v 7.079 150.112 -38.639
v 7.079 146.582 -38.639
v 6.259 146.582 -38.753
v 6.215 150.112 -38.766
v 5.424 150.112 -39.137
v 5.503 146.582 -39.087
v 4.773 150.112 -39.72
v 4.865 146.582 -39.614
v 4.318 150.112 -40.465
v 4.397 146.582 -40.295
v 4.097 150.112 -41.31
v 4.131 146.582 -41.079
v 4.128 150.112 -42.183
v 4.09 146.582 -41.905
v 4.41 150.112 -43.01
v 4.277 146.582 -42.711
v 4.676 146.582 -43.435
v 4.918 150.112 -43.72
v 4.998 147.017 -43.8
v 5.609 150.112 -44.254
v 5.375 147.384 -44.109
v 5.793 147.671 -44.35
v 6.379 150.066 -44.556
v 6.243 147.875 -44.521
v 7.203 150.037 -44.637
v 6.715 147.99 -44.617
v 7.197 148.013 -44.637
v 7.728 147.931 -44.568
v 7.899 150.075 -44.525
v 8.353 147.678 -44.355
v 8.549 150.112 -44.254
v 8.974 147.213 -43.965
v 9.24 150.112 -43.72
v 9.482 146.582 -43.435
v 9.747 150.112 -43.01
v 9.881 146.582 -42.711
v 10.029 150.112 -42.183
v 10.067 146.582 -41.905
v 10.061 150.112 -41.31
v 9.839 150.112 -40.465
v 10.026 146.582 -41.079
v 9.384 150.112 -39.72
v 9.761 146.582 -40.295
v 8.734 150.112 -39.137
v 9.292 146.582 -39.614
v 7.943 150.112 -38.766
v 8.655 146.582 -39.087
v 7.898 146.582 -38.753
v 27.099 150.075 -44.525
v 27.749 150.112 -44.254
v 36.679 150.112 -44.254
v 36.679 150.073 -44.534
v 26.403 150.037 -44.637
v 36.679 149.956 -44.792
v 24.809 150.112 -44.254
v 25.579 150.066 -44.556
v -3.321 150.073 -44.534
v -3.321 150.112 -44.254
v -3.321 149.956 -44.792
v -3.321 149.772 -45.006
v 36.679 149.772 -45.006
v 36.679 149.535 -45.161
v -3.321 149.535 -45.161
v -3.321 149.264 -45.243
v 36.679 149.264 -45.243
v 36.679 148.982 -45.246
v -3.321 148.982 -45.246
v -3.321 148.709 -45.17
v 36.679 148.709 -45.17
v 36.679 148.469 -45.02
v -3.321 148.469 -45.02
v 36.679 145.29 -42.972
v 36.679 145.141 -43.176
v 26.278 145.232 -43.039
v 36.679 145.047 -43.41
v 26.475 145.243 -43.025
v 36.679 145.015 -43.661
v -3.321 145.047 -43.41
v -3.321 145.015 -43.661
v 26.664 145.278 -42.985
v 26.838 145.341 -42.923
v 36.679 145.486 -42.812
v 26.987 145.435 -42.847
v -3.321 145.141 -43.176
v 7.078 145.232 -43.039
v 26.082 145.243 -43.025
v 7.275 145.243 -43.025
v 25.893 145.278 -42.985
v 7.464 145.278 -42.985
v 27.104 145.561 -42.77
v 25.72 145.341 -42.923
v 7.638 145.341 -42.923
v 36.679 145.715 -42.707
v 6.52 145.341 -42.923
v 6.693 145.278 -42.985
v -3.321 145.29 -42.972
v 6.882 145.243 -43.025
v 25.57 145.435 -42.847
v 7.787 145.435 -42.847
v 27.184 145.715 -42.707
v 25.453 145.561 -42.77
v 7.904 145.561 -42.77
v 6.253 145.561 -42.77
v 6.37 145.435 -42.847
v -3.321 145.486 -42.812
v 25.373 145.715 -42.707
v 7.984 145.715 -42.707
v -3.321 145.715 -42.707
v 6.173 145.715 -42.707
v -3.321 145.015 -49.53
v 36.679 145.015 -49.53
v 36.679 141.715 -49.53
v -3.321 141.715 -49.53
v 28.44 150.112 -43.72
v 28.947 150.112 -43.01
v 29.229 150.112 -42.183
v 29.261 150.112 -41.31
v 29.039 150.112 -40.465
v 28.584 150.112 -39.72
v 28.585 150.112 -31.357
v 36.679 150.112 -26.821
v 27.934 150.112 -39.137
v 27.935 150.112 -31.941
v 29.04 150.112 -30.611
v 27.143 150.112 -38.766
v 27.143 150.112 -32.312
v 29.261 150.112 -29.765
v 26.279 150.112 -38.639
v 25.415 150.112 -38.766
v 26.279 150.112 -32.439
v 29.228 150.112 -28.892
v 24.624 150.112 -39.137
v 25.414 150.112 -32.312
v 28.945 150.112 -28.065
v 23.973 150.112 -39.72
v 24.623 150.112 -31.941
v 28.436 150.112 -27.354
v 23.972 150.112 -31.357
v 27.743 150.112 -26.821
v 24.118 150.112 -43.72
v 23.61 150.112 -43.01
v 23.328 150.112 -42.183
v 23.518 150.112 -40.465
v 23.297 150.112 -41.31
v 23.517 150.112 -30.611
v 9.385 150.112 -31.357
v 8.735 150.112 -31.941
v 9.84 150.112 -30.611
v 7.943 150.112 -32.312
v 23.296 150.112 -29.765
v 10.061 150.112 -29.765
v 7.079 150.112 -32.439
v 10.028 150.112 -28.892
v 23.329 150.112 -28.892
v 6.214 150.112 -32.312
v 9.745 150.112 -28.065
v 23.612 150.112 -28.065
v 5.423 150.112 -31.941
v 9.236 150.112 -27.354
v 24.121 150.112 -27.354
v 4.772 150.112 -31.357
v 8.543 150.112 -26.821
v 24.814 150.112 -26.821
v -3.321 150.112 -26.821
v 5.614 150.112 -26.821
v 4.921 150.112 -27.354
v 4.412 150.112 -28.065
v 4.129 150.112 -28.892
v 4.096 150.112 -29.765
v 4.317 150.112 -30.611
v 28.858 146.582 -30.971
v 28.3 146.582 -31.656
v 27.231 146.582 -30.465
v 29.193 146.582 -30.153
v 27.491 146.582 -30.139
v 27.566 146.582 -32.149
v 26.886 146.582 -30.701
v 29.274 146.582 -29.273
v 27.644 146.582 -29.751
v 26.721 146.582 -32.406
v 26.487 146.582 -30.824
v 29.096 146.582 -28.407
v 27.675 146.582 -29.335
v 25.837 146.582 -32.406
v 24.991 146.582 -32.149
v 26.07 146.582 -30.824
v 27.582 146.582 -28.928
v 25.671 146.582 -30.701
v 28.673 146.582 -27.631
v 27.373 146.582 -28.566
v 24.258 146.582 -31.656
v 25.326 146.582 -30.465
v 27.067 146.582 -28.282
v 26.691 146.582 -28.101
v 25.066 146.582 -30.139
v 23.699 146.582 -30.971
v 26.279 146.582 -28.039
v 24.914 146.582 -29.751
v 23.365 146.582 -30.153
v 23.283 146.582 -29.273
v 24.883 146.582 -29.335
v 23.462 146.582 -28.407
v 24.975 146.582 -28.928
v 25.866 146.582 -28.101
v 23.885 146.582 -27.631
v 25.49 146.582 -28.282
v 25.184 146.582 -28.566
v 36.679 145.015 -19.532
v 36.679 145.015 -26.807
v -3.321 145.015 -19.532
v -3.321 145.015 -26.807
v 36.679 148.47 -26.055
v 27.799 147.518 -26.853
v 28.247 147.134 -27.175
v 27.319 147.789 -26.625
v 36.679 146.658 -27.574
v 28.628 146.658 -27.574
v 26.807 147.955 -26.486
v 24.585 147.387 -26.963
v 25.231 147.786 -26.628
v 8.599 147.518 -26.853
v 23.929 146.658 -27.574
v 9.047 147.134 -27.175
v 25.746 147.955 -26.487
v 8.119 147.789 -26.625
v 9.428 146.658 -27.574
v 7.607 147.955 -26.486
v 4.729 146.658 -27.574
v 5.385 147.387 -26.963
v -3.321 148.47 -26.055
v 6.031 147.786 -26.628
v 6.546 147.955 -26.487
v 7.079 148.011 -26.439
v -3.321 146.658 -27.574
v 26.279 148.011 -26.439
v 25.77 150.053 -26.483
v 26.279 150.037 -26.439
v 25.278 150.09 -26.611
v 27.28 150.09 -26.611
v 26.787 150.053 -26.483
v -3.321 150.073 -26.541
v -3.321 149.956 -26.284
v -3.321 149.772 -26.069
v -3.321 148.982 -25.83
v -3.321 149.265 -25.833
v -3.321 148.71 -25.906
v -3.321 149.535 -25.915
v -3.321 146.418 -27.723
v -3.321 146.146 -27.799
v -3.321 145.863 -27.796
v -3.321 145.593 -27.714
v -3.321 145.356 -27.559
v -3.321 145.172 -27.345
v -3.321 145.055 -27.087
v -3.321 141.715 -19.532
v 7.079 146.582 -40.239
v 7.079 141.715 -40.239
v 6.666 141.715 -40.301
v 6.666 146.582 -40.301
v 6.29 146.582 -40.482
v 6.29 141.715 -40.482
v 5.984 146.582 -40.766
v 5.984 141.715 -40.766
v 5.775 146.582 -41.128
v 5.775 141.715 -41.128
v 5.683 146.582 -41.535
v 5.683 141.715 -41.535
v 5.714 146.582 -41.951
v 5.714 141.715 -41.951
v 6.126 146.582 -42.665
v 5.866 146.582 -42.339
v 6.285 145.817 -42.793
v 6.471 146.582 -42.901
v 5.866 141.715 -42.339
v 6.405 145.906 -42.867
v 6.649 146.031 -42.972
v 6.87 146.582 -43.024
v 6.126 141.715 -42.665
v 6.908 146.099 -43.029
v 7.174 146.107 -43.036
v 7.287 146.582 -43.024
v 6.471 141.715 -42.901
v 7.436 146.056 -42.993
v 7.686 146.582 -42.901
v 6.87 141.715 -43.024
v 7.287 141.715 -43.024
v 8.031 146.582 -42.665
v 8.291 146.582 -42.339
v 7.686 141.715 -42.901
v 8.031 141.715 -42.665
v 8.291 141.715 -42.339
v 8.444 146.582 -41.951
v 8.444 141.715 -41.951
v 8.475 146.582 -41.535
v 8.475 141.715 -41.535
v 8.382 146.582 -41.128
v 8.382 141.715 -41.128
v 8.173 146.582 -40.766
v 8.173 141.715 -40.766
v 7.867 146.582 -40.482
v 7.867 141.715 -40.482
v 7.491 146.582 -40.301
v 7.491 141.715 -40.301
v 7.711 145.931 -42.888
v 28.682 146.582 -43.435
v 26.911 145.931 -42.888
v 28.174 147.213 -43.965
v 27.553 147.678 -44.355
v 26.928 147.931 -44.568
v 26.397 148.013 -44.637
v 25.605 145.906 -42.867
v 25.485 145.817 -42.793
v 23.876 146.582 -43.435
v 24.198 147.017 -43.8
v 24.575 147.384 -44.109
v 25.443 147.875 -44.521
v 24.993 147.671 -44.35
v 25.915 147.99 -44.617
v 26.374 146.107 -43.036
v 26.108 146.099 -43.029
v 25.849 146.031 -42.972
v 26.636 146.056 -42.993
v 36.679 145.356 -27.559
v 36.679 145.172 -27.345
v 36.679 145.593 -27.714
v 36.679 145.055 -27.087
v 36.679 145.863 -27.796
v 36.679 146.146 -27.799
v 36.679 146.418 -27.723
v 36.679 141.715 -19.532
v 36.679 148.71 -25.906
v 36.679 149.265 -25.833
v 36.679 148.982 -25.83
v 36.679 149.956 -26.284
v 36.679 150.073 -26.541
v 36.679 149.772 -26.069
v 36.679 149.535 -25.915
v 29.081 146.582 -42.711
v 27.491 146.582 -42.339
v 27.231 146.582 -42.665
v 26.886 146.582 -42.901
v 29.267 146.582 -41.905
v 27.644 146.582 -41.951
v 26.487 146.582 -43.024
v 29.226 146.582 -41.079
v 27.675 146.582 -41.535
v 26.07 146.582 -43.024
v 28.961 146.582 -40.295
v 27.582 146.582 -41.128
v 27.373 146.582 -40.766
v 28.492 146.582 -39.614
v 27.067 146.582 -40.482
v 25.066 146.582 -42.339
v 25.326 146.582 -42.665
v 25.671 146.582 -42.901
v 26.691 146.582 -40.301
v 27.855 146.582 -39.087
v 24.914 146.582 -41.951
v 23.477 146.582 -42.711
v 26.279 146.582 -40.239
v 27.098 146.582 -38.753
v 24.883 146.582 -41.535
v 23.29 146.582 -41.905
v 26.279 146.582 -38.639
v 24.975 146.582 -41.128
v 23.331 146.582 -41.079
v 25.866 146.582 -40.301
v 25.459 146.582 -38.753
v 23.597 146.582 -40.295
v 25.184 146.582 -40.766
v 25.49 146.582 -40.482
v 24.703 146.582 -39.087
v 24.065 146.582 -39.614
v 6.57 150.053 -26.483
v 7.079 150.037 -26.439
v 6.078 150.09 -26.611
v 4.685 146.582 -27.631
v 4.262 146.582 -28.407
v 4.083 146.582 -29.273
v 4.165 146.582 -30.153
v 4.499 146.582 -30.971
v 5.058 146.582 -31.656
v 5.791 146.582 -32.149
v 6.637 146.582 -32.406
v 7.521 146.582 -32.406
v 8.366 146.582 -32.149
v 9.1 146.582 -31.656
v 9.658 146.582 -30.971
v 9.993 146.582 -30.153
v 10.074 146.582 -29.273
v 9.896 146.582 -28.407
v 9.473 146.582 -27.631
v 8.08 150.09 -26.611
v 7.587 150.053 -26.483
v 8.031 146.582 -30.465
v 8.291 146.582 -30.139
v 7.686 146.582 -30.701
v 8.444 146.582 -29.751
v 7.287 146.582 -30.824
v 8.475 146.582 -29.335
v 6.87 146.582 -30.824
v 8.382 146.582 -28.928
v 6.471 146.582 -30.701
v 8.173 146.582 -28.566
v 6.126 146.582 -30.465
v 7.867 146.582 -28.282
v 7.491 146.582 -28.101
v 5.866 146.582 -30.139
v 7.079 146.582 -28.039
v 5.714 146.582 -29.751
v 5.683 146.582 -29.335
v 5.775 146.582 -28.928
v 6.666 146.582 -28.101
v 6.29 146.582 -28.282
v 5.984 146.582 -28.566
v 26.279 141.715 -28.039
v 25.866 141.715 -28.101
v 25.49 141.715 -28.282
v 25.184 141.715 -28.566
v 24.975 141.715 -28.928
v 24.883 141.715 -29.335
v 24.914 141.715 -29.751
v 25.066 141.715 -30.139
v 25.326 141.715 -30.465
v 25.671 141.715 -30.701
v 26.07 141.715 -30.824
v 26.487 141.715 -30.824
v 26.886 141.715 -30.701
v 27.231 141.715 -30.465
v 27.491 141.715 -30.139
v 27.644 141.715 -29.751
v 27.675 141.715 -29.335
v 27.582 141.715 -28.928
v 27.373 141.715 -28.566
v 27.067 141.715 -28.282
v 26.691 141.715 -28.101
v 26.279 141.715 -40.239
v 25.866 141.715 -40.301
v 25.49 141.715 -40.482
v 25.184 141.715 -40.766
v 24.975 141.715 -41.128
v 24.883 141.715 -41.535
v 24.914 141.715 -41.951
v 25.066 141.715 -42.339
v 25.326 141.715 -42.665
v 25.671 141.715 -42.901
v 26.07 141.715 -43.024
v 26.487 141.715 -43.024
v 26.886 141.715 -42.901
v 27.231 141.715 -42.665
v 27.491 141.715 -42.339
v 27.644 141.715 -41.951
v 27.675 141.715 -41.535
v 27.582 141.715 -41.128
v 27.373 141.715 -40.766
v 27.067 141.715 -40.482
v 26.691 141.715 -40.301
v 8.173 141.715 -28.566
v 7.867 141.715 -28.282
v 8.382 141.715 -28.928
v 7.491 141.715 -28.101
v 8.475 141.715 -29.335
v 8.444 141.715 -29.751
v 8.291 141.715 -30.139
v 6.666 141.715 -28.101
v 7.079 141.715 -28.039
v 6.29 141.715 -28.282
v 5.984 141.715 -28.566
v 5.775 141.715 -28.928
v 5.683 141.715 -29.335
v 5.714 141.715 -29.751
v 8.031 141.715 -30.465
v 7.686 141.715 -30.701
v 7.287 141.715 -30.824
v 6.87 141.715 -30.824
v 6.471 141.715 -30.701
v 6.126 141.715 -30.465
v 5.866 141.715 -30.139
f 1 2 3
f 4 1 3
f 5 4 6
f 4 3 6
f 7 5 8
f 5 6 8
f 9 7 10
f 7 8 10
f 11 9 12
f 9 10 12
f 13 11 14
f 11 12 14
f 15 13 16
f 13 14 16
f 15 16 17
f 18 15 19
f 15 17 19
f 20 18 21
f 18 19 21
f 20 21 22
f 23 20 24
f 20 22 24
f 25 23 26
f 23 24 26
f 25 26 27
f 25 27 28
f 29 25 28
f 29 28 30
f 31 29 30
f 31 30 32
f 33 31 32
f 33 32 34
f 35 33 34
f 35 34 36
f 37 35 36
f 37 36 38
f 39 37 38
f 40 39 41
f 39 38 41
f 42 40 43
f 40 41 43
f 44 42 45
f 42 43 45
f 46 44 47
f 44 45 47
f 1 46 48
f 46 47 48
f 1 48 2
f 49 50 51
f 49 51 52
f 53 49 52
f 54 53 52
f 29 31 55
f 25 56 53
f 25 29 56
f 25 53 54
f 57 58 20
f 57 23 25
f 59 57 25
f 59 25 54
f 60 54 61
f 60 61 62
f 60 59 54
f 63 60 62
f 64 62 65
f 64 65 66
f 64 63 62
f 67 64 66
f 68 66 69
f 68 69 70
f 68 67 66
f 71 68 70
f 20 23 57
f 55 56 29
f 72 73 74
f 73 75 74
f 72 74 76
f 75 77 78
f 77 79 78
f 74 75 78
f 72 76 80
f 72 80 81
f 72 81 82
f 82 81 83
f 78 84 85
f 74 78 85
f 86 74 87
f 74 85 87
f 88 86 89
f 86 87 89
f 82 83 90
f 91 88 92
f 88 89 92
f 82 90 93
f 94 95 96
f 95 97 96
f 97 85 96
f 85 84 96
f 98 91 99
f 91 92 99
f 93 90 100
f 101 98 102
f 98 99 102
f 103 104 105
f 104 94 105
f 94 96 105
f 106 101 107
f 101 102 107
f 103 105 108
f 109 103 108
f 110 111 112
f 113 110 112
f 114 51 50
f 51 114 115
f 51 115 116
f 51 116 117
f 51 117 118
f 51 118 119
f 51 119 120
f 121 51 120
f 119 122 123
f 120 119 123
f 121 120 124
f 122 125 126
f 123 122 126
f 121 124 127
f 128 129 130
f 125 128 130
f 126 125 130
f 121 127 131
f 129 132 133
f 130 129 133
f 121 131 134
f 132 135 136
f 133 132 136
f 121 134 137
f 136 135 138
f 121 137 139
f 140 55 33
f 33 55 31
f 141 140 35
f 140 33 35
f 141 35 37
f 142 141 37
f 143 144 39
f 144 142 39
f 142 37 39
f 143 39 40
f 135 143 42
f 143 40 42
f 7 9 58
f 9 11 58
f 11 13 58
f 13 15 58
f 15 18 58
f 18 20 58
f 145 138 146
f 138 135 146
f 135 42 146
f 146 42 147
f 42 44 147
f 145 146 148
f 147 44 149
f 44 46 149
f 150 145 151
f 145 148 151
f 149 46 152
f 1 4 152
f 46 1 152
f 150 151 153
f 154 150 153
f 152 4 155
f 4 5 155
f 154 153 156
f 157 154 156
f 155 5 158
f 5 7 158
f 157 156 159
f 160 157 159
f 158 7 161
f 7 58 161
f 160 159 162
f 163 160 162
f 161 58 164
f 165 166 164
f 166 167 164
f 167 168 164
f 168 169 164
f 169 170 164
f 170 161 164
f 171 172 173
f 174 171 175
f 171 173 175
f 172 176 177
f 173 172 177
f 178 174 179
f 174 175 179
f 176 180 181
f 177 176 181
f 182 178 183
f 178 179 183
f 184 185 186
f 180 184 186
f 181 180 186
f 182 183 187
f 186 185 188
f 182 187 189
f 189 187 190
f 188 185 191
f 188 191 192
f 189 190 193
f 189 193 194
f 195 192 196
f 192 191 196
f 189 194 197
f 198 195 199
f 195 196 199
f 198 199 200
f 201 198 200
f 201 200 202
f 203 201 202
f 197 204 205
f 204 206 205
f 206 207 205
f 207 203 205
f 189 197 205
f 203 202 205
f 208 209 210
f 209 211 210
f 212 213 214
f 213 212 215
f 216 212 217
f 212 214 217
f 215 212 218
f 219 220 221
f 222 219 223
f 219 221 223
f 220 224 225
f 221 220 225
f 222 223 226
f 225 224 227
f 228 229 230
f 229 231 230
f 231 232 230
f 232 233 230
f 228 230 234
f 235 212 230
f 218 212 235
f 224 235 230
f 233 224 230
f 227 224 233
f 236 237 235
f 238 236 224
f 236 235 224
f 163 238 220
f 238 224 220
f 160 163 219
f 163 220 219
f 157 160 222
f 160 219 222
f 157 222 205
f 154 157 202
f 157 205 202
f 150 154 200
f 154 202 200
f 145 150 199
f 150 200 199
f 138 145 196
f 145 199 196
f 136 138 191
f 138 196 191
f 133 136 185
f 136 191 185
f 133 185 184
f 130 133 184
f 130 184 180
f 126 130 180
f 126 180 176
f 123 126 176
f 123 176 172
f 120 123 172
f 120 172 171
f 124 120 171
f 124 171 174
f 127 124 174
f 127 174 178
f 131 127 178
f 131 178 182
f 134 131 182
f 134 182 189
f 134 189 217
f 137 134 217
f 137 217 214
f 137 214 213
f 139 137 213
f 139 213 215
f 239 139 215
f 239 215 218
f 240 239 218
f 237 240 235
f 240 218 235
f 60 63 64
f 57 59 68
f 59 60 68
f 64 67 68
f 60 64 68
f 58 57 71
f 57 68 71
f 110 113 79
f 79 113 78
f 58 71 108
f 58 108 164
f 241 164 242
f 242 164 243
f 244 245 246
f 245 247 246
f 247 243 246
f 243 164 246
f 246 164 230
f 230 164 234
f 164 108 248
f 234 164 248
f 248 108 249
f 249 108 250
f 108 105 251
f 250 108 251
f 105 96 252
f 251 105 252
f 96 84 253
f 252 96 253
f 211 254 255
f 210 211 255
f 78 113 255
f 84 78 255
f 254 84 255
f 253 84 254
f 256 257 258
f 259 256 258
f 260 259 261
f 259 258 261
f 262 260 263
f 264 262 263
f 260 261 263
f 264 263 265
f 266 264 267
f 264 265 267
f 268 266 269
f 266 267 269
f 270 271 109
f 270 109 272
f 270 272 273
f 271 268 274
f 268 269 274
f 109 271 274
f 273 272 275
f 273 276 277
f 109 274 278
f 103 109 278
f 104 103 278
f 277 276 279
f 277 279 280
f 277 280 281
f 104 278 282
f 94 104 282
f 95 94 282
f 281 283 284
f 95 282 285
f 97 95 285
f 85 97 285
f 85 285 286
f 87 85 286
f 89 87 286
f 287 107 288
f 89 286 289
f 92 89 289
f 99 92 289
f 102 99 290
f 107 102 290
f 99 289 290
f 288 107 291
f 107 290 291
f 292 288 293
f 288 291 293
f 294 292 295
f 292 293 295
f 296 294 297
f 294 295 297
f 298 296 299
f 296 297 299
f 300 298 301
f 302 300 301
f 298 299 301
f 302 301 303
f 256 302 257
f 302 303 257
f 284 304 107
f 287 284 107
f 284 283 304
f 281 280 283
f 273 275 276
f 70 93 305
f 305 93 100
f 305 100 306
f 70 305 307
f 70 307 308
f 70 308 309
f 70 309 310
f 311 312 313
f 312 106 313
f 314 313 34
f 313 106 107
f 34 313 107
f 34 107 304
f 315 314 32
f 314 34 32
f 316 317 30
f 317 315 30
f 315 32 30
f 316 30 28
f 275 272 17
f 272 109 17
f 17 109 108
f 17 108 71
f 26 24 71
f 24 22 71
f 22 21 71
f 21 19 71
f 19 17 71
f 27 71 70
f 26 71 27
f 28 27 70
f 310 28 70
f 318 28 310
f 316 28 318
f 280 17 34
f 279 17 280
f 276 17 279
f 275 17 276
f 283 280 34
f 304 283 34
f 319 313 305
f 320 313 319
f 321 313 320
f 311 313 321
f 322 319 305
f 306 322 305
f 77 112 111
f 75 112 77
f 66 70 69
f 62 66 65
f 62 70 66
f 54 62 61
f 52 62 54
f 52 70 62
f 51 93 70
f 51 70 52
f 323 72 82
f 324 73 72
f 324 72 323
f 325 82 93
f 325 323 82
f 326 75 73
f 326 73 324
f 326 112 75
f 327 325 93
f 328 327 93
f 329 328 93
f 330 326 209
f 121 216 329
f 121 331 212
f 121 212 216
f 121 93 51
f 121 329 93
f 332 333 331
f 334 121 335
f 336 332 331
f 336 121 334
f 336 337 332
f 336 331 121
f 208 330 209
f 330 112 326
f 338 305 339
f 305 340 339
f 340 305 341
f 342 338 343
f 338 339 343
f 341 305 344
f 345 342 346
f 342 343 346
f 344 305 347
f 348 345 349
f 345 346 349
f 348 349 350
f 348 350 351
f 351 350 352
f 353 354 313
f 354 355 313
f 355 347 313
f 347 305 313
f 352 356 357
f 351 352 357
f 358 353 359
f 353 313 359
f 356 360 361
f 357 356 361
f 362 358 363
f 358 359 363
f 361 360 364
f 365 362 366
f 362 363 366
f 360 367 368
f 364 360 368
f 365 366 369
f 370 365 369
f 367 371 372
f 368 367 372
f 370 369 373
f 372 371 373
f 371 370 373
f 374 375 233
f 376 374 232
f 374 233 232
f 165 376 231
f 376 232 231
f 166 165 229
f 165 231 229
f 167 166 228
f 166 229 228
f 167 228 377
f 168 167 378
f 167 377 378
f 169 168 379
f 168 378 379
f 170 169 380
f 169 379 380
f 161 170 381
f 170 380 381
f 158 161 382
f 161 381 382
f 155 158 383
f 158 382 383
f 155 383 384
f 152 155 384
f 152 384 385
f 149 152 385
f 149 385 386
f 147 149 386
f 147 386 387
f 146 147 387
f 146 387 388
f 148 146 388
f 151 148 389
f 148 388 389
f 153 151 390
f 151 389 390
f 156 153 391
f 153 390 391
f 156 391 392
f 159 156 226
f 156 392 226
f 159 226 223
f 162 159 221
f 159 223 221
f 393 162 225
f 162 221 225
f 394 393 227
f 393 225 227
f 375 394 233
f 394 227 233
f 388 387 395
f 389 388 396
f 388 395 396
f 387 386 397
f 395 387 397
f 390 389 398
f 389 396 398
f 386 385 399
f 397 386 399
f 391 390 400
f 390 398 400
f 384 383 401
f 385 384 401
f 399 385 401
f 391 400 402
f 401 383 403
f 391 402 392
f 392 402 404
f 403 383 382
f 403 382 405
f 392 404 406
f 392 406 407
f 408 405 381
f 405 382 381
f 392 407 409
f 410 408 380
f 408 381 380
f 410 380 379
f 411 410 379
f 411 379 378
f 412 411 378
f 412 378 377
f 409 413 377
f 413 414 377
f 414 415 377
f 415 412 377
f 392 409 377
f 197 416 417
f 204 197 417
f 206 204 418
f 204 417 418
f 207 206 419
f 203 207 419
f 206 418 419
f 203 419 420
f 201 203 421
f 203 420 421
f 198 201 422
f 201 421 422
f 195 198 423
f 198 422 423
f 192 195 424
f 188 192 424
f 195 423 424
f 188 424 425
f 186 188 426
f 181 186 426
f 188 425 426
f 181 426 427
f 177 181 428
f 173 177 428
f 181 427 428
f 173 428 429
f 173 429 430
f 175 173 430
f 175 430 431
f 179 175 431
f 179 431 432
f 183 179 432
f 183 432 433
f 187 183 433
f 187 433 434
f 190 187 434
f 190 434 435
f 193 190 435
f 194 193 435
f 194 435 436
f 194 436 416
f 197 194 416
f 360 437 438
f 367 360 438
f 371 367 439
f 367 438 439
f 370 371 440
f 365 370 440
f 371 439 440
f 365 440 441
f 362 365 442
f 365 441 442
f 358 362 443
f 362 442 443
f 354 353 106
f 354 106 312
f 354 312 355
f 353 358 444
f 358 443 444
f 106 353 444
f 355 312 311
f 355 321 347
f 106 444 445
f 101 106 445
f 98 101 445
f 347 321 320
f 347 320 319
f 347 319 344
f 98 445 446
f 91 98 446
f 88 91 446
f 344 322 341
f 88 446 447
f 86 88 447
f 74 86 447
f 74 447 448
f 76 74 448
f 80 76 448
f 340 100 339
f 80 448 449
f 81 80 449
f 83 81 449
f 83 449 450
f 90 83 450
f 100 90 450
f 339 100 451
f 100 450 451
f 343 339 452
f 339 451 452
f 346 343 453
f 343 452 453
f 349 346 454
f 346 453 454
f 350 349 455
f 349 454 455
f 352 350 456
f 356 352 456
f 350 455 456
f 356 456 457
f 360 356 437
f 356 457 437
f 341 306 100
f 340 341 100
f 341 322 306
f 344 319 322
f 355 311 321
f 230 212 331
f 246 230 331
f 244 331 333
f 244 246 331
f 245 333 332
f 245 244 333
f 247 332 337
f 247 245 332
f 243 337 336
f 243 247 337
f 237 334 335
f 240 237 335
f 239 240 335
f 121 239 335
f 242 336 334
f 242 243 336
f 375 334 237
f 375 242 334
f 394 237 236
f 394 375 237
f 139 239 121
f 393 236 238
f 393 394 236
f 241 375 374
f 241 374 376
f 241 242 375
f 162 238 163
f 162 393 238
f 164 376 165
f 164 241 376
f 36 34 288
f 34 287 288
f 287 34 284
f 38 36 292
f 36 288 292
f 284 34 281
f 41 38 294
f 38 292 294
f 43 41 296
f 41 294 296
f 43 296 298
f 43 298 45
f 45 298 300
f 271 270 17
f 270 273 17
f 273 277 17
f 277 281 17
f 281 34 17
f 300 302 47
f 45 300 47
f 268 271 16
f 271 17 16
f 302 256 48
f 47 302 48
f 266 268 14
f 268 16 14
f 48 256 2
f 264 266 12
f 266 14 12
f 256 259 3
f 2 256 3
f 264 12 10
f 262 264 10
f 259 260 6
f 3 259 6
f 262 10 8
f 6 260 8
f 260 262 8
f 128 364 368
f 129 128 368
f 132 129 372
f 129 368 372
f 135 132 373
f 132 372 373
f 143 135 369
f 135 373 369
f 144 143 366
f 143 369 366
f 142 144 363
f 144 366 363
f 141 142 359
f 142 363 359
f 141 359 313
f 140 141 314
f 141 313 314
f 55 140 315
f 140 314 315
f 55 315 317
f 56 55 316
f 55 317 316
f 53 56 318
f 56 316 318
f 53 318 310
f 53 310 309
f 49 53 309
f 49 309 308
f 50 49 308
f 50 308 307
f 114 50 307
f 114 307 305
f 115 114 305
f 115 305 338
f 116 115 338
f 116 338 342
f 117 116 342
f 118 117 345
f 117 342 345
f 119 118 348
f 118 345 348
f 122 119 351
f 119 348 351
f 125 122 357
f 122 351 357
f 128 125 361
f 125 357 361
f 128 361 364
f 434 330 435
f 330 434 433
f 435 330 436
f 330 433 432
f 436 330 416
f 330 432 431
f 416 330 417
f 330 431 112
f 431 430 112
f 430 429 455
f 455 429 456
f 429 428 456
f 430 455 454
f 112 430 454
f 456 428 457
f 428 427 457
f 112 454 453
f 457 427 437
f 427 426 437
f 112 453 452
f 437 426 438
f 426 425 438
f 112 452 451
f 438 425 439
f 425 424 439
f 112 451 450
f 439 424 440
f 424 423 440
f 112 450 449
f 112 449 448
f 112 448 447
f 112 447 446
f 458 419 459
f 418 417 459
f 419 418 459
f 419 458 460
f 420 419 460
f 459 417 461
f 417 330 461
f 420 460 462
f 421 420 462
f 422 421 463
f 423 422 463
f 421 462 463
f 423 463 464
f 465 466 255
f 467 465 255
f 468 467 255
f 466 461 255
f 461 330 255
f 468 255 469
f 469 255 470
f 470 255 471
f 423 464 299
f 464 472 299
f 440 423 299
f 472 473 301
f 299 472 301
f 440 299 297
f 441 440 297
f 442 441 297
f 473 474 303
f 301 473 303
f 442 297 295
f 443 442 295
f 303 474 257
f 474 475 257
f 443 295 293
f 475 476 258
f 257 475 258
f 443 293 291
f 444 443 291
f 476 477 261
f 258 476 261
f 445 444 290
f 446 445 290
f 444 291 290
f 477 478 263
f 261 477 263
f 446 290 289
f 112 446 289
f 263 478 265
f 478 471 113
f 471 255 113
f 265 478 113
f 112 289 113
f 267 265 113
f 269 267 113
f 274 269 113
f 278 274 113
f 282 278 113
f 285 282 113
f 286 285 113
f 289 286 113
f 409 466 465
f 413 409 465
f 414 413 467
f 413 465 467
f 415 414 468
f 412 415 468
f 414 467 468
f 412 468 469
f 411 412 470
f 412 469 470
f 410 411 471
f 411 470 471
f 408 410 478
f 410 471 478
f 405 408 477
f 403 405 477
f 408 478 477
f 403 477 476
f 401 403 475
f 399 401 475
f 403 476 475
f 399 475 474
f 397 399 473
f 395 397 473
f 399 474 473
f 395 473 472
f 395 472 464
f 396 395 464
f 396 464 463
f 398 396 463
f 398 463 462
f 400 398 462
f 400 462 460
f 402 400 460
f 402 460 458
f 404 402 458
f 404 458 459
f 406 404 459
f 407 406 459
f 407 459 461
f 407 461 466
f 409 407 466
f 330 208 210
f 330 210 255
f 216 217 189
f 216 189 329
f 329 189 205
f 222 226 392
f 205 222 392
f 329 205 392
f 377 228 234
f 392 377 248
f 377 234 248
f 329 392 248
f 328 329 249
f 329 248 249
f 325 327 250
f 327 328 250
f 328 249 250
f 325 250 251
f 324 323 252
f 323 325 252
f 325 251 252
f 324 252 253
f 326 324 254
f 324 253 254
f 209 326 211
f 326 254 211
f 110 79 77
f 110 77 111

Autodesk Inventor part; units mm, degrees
ref_plane "YZ Plane" through (0, 0, 0) normal (1, 0, 0) x (0, 1, 0)
ref_plane "XZ Plane" through (0, 0, 0) normal (0, 1, 0) x (-1, 0, 0)
ref_plane "XY Plane" through (0, 0, 0) normal (0, 0, 1) x (1, 0, 0)
ref_plane "Arbeitsebene9" through (-58.9003, 150.915, -19.5294) normal (1, 0, 0) x (0, 1, 0.0002861)
ref_plane "Arbeitsebene10" through (-3.3213, 95.2, -15) normal (1, 0, 0) x (0, 1, 0)
sketch "Skizze8" plane through (-3.3213, 95.2, -15) normal (1, 0, 0) x (0, 1, 0)
  line L0 (51.0327, -12.5388) -> (54.3913, -9.7235)
  line L1 (55.2125, -10.1069) -> (55.2018, -30.9624)
  line L2 (54.3802, -31.345) -> (51.0244, -28.5262)
  line L3 (50.2028, -28.9088) -> (50.1999, -34.5321)
  line L4 (50.2154, -4.5321) -> (50.2115, -12.1553)
  line L5 (50.2154, -13.2238) -> (55.2125, -9.0351)
  line L6 (55.2125, -9.0351) -> (55.2125, -32.0442)
  line L7 (55.2125, -32.0442) -> (50.2154, -27.8467)
  line L8 (50.2154, -13.2238) -> (50.2154, -27.8467)
  line L9 (54.9125, -9.678) -> (50.5154, -13.3638)
  line L10 (50.5154, -13.3638) -> (50.5154, -27.7069)
  line L11 (50.5154, -27.7069) -> (54.9125, -31.4004)
  line L12 (54.9125, -31.4004) -> (54.9125, -9.678)
  line L13 (50.5154, -13.3638) -> (46.5154, -13.3638)
  line L14 (50.5154, -13.3638) -> (54.5154, -13.3638) construction
  line L15 (46.5154, -13.3638) -> (46.5154, -27.7069)
  line L16 (46.5154, -27.7069) -> (50.5154, -27.7069)
  line L17 (67.5498, -4.541) -> (50.2154, -4.5321)
  line L18 (61.046, -34.5285) -> (50.2065, -34.5303)
  line L19 (46.5154, -13.3638) -> (49.8154, -13.3638)
  line L20 (49.8154, -13.3638) -> (49.8154, -4.5318)
  line L21 (49.8154, -4.5318) -> (46.5154, -4.5318)
  line L22 (46.5154, -4.5318) -> (46.5154, -13.3638)
  line L23 (46.5154, -27.7069) -> (49.8154, -27.7069)
  line L24 (49.8154, -27.7069) -> (49.8154, -34.5304)
  line L25 (49.8154, -34.5304) -> (46.5154, -34.5304)
  line L26 (46.5154, -34.5304) -> (46.5154, -27.7069)
  point P0 (-95.2, 15)
  point P1 (50.2154, -27.7069)
  point P2 (54.3913, -9.7235)
  point P3 (50.2154, -13.3638)
  dimension "d62" = 0.3
  dimension "d63" = 4
  dimension "d64" = 180
  dimension "d65" = 0.4
extrude "Extrusion5" add sketch "Skizze8" along normal blind 40 contours L13 L10 L16 L8 | L8 L16 L15 L13 | L9 L12 L11 L10 | L13 L22 L21 L20 | L24 L25 L26 L16
sketch "Skizze9" plane through (-3.3213, 150.1125, -5.7071) normal (0, 1, 0) x (1, 0, 0)
  line L0 (10.4, 23.7321) -> (29.6, 23.7321)
  line L1 (29.6, 23.7321) -> (29.6, 35.9321)
  line L2 (29.6, 35.9321) -> (10.4, 35.9321)
  line L3 (10.4, 35.9321) -> (10.4, 23.7321)
  line L4 (10.4, 23.7321) -> (29.6, 35.9321) construction
  line L5 (29.6, 23.7321) -> (10.4, 35.9321) construction
  line L6 (0, 40.6933) -> (0, 18.9709) projected
  line L7 (0, 18.9709) -> (40, 18.9709) projected
  line L8 (40, 40.6933) -> (40, 18.9709) projected
  line L9 (0, 40.6933) -> (40, 40.6933) projected
  point P0 (3.3213, -5.7071)
  point P1 (20, 29.8321)
  dimension "d52" = 19.2
  dimension "d53" = 12.2
fillet "Rundung3" radius 1 5 edges at (16.6787, 150.1125, -24.678) (16.6787, 150.1125, -46.4004) (16.6787, 145.0154, -42.7069) (16.6787, 145.7154, -28.3638) (16.6787, 145.0154, -28.3638)
hole "Bohrung4" at (7.0787, 150.1125, -29.4392) at (26.2787, 150.1125, -29.4392) at (26.2787, 150.1125, -41.6392) at (7.0787, 150.1125, -41.6392) direction (0, -1, 0) diameter 2.8 end through all counterbore diameter 6 counterbore depth 3.53
ref_plane "Arbeitsebene11" through (-3.3213, 141.7154, -34.5311) normal (0, 0, 1) x (1, 0, 0)
ref_plane "Arbeitsebene12" through (16.6787, 95.2, -15) normal (1, 0, 0) x (0, 0, -1)
properties part number "40_Cube_Z-only_illuminationarm_base-wifiholder_slidermount"
